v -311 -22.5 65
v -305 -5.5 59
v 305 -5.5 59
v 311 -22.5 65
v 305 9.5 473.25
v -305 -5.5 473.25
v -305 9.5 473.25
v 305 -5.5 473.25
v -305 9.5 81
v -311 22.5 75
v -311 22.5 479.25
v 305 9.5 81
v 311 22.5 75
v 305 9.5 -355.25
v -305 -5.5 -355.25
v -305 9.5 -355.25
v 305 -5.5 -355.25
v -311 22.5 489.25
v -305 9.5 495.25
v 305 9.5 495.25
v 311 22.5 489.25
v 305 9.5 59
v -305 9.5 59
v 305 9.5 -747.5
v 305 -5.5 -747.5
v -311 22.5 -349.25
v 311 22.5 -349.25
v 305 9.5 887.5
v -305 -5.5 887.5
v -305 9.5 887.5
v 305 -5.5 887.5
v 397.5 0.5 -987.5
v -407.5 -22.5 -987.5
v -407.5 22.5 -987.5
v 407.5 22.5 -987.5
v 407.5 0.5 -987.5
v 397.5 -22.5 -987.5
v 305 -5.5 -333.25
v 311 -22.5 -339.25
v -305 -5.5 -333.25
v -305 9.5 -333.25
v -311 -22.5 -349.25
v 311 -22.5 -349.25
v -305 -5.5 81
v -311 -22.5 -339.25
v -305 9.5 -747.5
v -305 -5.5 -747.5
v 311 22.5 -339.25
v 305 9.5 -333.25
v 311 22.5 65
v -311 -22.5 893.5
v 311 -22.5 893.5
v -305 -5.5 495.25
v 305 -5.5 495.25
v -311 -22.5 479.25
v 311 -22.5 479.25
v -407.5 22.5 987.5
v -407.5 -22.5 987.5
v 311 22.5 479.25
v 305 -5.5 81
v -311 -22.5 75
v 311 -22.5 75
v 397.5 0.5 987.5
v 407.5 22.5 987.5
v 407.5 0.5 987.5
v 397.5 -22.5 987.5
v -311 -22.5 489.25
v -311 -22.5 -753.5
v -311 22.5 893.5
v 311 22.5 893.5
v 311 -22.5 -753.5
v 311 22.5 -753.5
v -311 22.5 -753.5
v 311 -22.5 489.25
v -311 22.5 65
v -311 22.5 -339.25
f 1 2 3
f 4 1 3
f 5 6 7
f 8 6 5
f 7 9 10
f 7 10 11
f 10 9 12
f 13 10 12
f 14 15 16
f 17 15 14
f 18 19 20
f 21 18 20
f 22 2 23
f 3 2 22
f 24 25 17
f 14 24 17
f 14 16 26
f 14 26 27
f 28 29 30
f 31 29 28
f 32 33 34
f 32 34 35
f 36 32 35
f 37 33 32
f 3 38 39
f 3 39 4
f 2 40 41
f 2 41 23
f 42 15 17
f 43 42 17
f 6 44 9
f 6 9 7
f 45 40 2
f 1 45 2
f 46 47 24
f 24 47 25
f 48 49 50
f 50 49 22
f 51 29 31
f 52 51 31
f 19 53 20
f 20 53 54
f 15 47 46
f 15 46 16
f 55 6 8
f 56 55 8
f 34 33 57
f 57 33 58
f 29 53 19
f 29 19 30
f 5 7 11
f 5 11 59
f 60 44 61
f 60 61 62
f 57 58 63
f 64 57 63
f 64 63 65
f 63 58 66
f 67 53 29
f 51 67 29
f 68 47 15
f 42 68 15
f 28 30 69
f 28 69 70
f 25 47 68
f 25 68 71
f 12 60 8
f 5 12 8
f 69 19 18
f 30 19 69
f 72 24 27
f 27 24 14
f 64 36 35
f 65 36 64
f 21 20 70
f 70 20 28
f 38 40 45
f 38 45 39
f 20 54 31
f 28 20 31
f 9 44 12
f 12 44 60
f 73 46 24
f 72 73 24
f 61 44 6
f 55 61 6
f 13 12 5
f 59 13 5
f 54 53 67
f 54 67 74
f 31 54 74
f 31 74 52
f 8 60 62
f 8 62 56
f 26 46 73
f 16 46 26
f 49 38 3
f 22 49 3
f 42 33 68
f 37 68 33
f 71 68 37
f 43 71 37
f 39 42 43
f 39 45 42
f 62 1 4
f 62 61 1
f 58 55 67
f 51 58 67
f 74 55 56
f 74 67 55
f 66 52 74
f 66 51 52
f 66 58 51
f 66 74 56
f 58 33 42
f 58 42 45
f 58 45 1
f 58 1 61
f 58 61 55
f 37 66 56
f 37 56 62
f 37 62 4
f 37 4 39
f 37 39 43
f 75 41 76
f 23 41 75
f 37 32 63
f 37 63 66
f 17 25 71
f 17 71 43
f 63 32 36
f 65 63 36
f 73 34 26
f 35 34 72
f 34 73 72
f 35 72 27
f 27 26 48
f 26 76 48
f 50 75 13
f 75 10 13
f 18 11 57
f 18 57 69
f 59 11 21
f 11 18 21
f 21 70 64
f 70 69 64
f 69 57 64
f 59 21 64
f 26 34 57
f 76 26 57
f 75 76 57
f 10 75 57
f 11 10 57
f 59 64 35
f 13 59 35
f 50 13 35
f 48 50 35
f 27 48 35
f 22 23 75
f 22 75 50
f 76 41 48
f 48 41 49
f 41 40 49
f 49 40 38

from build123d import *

# Parameters (mm, degrees)
F0_W     = 815
F0_H     = 1975
F0_W_2   = 610
F0_H_2   = 392.25
F1_DEPTH = 22.5
F2_SIZE2 = 17
F2_SIZE  = 6
F3_SIZE2 = 13
F3_SIZE  = 6
F4_W     = 10
F4_H     = 23
F5_DEPTH = 1975.001


with BuildPart() as f1:
    # F0 (on Front) → F1 (new body, symmetric)
    with BuildSketch(Plane.XZ):
        Rectangle(F0_W, F0_H)
        with Locations((0, -551.375)):
            Rectangle(F0_W_2, F0_H_2, mode=Mode.SUBTRACT)
        with Locations((0, -137.125)):
            Rectangle(F0_W_2, F0_H_2, mode=Mode.SUBTRACT)
        with Locations((0, 277.125)):
            Rectangle(F0_W_2, F0_H_2, mode=Mode.SUBTRACT)
        with Locations((0, 691.375)):
            Rectangle(F0_W_2, F0_H_2, mode=Mode.SUBTRACT)
    extrude(amount=F1_DEPTH, both=True)

    # F2
    f2_edges = [f1.edges().sort_by_distance(p)[0] for p in [
        (305, -22.5, -551.375),
        (0, -22.5, -355.25),
        (305, -22.5, -137.125),
        (0, -22.5, 59),
        (305, -22.5, 277.125),
        (0, -22.5, 473.25),
        (305, -22.5, 691.375),
        (0, -22.5, 887.5),
        (-305, -22.5, 691.375),
        (0, -22.5, 495.25),
        (-305, -22.5, 277.125),
        (0, -22.5, 81),
        (-305, -22.5, -137.125),
        (0, -22.5, -333.25),
        (-305, -22.5, -551.375),
        (0, -22.5, -747.5),
    ]]
    f2_side = f1.faces().sort_by_distance((0, -22.5, 966.13449))[0]
    chamfer(f2_edges, length=F2_SIZE, length2=F2_SIZE2, reference=f2_side)

    # F3
    f3_edges = [f1.edges().sort_by_distance(p)[0] for p in [
        (0, 22.5, -747.5),
        (305, 22.5, -551.375),
        (0, 22.5, -355.25),
        (-305, 22.5, -551.375),
        (-305, 22.5, -137.125),
        (0, 22.5, 59),
        (-305, 22.5, 277.125),
        (0, 22.5, -333.25),
        (305, 22.5, -137.125),
        (0, 22.5, 81),
        (305, 22.5, 277.125),
        (0, 22.5, 473.25),
        (305, 22.5, 691.375),
        (0, 22.5, 887.5),
        (-305, 22.5, 691.375),
        (0, 22.5, 495.25),
    ]]
    f3_side = f1.faces().sort_by_distance((0, 22.5, 966.13449))[0]
    chamfer(f3_edges, length=F3_SIZE, length2=F3_SIZE2, reference=f3_side)

    # F4 (on face) → F5 (cut, through all)
    with BuildSketch(Plane(origin=(0, 0, -987.5), x_dir=(1, 0, 0), z_dir=(0, 0, -1))):
        with Locations((402.5, 11)):
            Rectangle(F4_W, F4_H)
    extrude(amount=-F5_DEPTH, mode=Mode.SUBTRACT)


solid = f1.part
